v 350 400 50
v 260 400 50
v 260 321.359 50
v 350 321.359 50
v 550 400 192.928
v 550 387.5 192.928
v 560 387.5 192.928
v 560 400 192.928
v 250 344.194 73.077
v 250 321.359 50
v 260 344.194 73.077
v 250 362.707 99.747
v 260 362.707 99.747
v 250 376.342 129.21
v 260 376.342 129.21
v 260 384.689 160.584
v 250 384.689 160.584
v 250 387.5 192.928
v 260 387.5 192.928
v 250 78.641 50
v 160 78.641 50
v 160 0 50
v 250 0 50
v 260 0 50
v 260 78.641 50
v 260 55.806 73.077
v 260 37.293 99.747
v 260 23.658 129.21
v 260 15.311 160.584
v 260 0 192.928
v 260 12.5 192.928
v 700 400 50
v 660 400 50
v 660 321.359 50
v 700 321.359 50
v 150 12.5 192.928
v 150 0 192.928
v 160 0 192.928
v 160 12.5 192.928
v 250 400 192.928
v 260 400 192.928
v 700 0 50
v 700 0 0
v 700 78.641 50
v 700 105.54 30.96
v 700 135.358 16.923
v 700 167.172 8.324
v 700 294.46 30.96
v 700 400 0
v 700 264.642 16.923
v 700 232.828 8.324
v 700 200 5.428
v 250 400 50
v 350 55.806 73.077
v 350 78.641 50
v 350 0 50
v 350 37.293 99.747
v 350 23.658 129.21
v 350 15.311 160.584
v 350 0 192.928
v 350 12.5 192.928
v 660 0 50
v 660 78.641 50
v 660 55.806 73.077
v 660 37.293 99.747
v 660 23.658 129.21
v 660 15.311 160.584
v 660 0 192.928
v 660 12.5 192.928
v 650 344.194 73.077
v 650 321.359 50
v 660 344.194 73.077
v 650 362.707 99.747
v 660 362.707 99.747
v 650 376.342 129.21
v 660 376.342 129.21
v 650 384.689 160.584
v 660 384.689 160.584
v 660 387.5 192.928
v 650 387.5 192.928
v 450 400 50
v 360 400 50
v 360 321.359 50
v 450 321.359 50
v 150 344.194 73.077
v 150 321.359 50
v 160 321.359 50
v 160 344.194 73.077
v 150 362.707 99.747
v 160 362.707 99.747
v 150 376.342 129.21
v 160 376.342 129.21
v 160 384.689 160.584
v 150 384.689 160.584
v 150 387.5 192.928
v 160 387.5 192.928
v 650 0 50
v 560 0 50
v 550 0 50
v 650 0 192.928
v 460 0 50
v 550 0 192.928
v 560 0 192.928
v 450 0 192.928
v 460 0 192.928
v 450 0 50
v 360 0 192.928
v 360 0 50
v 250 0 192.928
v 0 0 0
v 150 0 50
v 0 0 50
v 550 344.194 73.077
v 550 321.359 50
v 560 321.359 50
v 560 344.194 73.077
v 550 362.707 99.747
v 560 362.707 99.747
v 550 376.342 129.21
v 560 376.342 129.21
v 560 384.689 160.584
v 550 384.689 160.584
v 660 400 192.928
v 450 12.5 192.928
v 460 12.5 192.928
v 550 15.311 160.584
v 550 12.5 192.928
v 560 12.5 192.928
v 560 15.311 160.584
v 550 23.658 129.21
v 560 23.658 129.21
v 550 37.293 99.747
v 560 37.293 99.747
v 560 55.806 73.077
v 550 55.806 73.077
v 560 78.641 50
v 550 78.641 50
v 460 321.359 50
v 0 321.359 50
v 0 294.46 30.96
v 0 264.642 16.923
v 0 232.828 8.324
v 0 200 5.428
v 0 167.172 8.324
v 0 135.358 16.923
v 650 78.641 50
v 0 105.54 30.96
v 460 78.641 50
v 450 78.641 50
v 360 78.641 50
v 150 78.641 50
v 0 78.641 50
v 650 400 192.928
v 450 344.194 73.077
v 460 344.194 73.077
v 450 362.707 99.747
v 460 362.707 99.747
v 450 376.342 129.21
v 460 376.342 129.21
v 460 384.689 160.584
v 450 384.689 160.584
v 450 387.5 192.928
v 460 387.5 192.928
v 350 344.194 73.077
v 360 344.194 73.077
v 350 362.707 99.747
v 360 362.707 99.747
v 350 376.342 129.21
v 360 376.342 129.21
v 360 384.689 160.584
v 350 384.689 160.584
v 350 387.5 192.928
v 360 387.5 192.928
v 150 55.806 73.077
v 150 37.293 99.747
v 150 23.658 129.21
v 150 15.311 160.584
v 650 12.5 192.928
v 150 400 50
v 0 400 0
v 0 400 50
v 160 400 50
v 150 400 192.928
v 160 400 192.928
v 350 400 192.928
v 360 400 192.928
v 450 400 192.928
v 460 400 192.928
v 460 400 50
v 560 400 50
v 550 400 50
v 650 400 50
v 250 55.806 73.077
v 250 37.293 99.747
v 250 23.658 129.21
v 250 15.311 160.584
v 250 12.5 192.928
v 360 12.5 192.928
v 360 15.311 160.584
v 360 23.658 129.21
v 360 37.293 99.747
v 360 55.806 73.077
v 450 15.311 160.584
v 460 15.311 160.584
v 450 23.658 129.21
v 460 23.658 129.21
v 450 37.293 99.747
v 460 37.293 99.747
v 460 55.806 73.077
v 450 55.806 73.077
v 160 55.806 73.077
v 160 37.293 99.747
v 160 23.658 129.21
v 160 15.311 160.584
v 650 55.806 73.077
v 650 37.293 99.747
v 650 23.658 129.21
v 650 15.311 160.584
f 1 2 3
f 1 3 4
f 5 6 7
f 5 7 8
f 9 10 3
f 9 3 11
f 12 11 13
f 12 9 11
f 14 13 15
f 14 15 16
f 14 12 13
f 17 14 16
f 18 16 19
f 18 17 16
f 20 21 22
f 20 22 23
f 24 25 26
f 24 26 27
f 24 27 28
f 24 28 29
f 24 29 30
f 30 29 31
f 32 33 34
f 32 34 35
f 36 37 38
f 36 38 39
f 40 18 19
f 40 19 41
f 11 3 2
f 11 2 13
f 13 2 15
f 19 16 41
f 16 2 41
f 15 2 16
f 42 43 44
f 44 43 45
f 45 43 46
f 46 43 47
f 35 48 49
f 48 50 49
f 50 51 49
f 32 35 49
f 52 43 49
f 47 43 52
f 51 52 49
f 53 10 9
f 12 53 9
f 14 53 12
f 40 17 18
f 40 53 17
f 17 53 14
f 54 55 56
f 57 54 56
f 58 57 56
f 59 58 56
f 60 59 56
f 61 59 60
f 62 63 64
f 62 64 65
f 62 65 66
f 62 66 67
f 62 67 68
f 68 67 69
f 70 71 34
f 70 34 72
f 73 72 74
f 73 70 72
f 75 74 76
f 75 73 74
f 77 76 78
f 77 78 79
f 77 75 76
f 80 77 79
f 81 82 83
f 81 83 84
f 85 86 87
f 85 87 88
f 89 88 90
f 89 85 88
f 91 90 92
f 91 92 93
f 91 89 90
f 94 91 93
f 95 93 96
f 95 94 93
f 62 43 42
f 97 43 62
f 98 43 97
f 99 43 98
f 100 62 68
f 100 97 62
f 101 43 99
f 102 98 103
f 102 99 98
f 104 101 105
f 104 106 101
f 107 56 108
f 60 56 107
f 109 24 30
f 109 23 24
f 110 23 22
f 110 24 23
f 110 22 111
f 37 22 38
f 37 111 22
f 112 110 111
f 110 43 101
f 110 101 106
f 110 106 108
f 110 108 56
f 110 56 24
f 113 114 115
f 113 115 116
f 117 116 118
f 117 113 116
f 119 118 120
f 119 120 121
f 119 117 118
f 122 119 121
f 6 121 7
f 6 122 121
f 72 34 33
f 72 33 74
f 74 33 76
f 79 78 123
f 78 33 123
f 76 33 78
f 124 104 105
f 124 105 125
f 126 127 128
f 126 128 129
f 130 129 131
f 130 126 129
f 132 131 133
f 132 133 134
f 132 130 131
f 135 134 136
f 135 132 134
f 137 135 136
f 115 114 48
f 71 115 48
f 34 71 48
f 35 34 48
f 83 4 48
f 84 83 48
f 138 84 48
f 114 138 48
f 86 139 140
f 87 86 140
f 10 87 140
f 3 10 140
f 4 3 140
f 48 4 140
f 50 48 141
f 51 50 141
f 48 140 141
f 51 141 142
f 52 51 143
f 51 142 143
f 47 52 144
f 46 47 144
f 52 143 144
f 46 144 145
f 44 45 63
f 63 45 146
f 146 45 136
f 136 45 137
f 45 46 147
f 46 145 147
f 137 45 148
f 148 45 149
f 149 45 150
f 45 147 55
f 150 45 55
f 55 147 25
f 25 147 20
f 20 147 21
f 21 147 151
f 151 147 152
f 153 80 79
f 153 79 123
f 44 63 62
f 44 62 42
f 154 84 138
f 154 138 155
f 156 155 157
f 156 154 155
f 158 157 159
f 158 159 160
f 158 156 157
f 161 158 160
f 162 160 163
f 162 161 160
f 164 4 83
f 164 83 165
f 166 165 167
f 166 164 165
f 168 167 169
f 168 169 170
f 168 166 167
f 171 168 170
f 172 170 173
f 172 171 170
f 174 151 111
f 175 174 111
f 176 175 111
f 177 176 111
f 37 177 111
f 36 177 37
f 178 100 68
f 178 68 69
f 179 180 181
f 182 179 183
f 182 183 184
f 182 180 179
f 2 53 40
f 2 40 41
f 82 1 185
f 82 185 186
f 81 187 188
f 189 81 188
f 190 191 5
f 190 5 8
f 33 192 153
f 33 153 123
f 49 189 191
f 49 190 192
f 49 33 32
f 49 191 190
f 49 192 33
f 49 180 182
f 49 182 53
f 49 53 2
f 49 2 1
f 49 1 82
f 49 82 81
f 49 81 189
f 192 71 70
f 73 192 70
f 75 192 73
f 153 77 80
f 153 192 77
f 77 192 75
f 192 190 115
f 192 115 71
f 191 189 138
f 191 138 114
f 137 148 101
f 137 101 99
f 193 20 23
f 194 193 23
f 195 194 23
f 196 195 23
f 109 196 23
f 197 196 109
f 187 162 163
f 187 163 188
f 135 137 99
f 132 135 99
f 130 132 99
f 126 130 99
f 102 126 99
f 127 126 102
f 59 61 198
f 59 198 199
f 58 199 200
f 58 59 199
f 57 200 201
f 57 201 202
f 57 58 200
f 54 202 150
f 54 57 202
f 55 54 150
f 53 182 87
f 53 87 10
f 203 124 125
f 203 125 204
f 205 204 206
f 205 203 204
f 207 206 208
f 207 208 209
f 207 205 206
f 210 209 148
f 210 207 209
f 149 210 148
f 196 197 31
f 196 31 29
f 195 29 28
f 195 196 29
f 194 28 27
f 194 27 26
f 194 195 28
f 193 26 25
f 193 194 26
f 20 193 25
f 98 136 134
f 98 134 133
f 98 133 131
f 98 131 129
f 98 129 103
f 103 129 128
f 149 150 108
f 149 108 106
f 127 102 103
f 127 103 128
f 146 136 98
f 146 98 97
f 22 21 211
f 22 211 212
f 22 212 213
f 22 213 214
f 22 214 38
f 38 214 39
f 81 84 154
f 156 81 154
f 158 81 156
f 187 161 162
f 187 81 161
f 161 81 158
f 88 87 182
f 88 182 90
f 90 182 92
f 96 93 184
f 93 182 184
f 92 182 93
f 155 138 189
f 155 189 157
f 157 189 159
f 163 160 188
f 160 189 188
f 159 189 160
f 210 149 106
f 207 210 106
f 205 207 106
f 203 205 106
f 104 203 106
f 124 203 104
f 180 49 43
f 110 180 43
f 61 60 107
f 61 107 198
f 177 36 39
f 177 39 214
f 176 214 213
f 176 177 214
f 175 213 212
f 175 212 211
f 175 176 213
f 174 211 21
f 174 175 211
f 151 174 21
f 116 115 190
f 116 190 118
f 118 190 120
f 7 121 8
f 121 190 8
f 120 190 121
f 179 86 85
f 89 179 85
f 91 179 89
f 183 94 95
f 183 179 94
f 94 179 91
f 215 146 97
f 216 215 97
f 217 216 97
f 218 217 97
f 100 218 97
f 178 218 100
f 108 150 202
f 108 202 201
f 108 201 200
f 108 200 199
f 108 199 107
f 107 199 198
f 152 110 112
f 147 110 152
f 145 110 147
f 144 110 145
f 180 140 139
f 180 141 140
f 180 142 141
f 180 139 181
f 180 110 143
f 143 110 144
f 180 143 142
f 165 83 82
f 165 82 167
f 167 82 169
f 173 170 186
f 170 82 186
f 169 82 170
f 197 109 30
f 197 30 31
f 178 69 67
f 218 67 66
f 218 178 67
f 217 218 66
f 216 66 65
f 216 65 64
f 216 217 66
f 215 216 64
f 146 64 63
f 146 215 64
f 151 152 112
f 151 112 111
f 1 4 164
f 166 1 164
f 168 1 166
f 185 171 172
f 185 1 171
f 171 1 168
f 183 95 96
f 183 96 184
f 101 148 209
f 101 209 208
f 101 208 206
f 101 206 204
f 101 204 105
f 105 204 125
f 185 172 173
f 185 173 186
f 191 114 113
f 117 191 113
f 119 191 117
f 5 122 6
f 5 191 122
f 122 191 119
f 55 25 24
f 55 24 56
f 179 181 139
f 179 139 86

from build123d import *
from build123d.topology import SkipClean

# Parameters (mm, degrees)
SKETCH1_W               = 700
SKETCH1_H               = 400
BOSS_EXTRUDE2_DEPTH     = 50
BOSS_EXTRUDE3_DEPTH     = 10
CUT_EXTRUDE1_DEPTH      = 788.223691227
CUT_EXTRUDE1_DEPTH_BACK = 788.223691227
LPATTERN1_COUNT         = 6
LPATTERN1_PITCH         = 100


with BuildPart() as part:
    # Sketch1 → Boss-Extrude2 (new body)
    with BuildSketch(Plane.XY):
        with Locations((350, 200)):
            Rectangle(SKETCH1_W, SKETCH1_H)
    extrude(amount=BOSS_EXTRUDE2_DEPTH)

    # Sketch2 → Boss-Extrude3 (add)
    with BuildSketch(Plane(origin=(650, 0, 0), x_dir=(0, 0, -1), z_dir=(1, 0, 0))):
        with BuildLine():
            Line((-50, 0), (-192.927810409, 0))
            Line((-192.927810409, 0), (-192.927810409, 12.5))
            ThreePointArc((-192.927810409, 12.5), (-5.427810409, 200), (-192.927810409, 387.5))
            Line((-192.927810409, 387.5), (-192.927810409, 400))
            Line((-192.927810409, 400), (-50, 400))
            Line((-50, 400), (0, 400))
            Line((0, 400), (0, 0))
            Line((0, 0), (-50, 0))
        make_face()
    boss_extrude3 = extrude(amount=BOSS_EXTRUDE3_DEPTH)

    # Sketch3 → Cut-Extrude1 (cut, two sides: drawn at the far end of the back side and taken through both)
    with SkipClean():  # the faces are left unmerged after this step: merging them gives an invalid solid
        with BuildSketch(Plane(origin=(650, 0, 0), x_dir=(0, 0, -1), z_dir=(1, 0, 0)).offset(-CUT_EXTRUDE1_DEPTH_BACK)):
            with BuildLine():
                Line((-50, 78.641477383), (-50, 321.358522617))
                ThreePointArc((-50, 321.358522617), (-5.427810409, 200), (-50, 78.641477383))
            make_face()
        extrude(amount=CUT_EXTRUDE1_DEPTH + CUT_EXTRUDE1_DEPTH_BACK, mode=Mode.SUBTRACT)

    # LPattern1: Boss-Extrude3 ×6
    with Locations(*[(-i * LPATTERN1_PITCH, 0, 0) for i in range(1, LPATTERN1_COUNT)]):
        add(boss_extrude3)


solid = part.part
